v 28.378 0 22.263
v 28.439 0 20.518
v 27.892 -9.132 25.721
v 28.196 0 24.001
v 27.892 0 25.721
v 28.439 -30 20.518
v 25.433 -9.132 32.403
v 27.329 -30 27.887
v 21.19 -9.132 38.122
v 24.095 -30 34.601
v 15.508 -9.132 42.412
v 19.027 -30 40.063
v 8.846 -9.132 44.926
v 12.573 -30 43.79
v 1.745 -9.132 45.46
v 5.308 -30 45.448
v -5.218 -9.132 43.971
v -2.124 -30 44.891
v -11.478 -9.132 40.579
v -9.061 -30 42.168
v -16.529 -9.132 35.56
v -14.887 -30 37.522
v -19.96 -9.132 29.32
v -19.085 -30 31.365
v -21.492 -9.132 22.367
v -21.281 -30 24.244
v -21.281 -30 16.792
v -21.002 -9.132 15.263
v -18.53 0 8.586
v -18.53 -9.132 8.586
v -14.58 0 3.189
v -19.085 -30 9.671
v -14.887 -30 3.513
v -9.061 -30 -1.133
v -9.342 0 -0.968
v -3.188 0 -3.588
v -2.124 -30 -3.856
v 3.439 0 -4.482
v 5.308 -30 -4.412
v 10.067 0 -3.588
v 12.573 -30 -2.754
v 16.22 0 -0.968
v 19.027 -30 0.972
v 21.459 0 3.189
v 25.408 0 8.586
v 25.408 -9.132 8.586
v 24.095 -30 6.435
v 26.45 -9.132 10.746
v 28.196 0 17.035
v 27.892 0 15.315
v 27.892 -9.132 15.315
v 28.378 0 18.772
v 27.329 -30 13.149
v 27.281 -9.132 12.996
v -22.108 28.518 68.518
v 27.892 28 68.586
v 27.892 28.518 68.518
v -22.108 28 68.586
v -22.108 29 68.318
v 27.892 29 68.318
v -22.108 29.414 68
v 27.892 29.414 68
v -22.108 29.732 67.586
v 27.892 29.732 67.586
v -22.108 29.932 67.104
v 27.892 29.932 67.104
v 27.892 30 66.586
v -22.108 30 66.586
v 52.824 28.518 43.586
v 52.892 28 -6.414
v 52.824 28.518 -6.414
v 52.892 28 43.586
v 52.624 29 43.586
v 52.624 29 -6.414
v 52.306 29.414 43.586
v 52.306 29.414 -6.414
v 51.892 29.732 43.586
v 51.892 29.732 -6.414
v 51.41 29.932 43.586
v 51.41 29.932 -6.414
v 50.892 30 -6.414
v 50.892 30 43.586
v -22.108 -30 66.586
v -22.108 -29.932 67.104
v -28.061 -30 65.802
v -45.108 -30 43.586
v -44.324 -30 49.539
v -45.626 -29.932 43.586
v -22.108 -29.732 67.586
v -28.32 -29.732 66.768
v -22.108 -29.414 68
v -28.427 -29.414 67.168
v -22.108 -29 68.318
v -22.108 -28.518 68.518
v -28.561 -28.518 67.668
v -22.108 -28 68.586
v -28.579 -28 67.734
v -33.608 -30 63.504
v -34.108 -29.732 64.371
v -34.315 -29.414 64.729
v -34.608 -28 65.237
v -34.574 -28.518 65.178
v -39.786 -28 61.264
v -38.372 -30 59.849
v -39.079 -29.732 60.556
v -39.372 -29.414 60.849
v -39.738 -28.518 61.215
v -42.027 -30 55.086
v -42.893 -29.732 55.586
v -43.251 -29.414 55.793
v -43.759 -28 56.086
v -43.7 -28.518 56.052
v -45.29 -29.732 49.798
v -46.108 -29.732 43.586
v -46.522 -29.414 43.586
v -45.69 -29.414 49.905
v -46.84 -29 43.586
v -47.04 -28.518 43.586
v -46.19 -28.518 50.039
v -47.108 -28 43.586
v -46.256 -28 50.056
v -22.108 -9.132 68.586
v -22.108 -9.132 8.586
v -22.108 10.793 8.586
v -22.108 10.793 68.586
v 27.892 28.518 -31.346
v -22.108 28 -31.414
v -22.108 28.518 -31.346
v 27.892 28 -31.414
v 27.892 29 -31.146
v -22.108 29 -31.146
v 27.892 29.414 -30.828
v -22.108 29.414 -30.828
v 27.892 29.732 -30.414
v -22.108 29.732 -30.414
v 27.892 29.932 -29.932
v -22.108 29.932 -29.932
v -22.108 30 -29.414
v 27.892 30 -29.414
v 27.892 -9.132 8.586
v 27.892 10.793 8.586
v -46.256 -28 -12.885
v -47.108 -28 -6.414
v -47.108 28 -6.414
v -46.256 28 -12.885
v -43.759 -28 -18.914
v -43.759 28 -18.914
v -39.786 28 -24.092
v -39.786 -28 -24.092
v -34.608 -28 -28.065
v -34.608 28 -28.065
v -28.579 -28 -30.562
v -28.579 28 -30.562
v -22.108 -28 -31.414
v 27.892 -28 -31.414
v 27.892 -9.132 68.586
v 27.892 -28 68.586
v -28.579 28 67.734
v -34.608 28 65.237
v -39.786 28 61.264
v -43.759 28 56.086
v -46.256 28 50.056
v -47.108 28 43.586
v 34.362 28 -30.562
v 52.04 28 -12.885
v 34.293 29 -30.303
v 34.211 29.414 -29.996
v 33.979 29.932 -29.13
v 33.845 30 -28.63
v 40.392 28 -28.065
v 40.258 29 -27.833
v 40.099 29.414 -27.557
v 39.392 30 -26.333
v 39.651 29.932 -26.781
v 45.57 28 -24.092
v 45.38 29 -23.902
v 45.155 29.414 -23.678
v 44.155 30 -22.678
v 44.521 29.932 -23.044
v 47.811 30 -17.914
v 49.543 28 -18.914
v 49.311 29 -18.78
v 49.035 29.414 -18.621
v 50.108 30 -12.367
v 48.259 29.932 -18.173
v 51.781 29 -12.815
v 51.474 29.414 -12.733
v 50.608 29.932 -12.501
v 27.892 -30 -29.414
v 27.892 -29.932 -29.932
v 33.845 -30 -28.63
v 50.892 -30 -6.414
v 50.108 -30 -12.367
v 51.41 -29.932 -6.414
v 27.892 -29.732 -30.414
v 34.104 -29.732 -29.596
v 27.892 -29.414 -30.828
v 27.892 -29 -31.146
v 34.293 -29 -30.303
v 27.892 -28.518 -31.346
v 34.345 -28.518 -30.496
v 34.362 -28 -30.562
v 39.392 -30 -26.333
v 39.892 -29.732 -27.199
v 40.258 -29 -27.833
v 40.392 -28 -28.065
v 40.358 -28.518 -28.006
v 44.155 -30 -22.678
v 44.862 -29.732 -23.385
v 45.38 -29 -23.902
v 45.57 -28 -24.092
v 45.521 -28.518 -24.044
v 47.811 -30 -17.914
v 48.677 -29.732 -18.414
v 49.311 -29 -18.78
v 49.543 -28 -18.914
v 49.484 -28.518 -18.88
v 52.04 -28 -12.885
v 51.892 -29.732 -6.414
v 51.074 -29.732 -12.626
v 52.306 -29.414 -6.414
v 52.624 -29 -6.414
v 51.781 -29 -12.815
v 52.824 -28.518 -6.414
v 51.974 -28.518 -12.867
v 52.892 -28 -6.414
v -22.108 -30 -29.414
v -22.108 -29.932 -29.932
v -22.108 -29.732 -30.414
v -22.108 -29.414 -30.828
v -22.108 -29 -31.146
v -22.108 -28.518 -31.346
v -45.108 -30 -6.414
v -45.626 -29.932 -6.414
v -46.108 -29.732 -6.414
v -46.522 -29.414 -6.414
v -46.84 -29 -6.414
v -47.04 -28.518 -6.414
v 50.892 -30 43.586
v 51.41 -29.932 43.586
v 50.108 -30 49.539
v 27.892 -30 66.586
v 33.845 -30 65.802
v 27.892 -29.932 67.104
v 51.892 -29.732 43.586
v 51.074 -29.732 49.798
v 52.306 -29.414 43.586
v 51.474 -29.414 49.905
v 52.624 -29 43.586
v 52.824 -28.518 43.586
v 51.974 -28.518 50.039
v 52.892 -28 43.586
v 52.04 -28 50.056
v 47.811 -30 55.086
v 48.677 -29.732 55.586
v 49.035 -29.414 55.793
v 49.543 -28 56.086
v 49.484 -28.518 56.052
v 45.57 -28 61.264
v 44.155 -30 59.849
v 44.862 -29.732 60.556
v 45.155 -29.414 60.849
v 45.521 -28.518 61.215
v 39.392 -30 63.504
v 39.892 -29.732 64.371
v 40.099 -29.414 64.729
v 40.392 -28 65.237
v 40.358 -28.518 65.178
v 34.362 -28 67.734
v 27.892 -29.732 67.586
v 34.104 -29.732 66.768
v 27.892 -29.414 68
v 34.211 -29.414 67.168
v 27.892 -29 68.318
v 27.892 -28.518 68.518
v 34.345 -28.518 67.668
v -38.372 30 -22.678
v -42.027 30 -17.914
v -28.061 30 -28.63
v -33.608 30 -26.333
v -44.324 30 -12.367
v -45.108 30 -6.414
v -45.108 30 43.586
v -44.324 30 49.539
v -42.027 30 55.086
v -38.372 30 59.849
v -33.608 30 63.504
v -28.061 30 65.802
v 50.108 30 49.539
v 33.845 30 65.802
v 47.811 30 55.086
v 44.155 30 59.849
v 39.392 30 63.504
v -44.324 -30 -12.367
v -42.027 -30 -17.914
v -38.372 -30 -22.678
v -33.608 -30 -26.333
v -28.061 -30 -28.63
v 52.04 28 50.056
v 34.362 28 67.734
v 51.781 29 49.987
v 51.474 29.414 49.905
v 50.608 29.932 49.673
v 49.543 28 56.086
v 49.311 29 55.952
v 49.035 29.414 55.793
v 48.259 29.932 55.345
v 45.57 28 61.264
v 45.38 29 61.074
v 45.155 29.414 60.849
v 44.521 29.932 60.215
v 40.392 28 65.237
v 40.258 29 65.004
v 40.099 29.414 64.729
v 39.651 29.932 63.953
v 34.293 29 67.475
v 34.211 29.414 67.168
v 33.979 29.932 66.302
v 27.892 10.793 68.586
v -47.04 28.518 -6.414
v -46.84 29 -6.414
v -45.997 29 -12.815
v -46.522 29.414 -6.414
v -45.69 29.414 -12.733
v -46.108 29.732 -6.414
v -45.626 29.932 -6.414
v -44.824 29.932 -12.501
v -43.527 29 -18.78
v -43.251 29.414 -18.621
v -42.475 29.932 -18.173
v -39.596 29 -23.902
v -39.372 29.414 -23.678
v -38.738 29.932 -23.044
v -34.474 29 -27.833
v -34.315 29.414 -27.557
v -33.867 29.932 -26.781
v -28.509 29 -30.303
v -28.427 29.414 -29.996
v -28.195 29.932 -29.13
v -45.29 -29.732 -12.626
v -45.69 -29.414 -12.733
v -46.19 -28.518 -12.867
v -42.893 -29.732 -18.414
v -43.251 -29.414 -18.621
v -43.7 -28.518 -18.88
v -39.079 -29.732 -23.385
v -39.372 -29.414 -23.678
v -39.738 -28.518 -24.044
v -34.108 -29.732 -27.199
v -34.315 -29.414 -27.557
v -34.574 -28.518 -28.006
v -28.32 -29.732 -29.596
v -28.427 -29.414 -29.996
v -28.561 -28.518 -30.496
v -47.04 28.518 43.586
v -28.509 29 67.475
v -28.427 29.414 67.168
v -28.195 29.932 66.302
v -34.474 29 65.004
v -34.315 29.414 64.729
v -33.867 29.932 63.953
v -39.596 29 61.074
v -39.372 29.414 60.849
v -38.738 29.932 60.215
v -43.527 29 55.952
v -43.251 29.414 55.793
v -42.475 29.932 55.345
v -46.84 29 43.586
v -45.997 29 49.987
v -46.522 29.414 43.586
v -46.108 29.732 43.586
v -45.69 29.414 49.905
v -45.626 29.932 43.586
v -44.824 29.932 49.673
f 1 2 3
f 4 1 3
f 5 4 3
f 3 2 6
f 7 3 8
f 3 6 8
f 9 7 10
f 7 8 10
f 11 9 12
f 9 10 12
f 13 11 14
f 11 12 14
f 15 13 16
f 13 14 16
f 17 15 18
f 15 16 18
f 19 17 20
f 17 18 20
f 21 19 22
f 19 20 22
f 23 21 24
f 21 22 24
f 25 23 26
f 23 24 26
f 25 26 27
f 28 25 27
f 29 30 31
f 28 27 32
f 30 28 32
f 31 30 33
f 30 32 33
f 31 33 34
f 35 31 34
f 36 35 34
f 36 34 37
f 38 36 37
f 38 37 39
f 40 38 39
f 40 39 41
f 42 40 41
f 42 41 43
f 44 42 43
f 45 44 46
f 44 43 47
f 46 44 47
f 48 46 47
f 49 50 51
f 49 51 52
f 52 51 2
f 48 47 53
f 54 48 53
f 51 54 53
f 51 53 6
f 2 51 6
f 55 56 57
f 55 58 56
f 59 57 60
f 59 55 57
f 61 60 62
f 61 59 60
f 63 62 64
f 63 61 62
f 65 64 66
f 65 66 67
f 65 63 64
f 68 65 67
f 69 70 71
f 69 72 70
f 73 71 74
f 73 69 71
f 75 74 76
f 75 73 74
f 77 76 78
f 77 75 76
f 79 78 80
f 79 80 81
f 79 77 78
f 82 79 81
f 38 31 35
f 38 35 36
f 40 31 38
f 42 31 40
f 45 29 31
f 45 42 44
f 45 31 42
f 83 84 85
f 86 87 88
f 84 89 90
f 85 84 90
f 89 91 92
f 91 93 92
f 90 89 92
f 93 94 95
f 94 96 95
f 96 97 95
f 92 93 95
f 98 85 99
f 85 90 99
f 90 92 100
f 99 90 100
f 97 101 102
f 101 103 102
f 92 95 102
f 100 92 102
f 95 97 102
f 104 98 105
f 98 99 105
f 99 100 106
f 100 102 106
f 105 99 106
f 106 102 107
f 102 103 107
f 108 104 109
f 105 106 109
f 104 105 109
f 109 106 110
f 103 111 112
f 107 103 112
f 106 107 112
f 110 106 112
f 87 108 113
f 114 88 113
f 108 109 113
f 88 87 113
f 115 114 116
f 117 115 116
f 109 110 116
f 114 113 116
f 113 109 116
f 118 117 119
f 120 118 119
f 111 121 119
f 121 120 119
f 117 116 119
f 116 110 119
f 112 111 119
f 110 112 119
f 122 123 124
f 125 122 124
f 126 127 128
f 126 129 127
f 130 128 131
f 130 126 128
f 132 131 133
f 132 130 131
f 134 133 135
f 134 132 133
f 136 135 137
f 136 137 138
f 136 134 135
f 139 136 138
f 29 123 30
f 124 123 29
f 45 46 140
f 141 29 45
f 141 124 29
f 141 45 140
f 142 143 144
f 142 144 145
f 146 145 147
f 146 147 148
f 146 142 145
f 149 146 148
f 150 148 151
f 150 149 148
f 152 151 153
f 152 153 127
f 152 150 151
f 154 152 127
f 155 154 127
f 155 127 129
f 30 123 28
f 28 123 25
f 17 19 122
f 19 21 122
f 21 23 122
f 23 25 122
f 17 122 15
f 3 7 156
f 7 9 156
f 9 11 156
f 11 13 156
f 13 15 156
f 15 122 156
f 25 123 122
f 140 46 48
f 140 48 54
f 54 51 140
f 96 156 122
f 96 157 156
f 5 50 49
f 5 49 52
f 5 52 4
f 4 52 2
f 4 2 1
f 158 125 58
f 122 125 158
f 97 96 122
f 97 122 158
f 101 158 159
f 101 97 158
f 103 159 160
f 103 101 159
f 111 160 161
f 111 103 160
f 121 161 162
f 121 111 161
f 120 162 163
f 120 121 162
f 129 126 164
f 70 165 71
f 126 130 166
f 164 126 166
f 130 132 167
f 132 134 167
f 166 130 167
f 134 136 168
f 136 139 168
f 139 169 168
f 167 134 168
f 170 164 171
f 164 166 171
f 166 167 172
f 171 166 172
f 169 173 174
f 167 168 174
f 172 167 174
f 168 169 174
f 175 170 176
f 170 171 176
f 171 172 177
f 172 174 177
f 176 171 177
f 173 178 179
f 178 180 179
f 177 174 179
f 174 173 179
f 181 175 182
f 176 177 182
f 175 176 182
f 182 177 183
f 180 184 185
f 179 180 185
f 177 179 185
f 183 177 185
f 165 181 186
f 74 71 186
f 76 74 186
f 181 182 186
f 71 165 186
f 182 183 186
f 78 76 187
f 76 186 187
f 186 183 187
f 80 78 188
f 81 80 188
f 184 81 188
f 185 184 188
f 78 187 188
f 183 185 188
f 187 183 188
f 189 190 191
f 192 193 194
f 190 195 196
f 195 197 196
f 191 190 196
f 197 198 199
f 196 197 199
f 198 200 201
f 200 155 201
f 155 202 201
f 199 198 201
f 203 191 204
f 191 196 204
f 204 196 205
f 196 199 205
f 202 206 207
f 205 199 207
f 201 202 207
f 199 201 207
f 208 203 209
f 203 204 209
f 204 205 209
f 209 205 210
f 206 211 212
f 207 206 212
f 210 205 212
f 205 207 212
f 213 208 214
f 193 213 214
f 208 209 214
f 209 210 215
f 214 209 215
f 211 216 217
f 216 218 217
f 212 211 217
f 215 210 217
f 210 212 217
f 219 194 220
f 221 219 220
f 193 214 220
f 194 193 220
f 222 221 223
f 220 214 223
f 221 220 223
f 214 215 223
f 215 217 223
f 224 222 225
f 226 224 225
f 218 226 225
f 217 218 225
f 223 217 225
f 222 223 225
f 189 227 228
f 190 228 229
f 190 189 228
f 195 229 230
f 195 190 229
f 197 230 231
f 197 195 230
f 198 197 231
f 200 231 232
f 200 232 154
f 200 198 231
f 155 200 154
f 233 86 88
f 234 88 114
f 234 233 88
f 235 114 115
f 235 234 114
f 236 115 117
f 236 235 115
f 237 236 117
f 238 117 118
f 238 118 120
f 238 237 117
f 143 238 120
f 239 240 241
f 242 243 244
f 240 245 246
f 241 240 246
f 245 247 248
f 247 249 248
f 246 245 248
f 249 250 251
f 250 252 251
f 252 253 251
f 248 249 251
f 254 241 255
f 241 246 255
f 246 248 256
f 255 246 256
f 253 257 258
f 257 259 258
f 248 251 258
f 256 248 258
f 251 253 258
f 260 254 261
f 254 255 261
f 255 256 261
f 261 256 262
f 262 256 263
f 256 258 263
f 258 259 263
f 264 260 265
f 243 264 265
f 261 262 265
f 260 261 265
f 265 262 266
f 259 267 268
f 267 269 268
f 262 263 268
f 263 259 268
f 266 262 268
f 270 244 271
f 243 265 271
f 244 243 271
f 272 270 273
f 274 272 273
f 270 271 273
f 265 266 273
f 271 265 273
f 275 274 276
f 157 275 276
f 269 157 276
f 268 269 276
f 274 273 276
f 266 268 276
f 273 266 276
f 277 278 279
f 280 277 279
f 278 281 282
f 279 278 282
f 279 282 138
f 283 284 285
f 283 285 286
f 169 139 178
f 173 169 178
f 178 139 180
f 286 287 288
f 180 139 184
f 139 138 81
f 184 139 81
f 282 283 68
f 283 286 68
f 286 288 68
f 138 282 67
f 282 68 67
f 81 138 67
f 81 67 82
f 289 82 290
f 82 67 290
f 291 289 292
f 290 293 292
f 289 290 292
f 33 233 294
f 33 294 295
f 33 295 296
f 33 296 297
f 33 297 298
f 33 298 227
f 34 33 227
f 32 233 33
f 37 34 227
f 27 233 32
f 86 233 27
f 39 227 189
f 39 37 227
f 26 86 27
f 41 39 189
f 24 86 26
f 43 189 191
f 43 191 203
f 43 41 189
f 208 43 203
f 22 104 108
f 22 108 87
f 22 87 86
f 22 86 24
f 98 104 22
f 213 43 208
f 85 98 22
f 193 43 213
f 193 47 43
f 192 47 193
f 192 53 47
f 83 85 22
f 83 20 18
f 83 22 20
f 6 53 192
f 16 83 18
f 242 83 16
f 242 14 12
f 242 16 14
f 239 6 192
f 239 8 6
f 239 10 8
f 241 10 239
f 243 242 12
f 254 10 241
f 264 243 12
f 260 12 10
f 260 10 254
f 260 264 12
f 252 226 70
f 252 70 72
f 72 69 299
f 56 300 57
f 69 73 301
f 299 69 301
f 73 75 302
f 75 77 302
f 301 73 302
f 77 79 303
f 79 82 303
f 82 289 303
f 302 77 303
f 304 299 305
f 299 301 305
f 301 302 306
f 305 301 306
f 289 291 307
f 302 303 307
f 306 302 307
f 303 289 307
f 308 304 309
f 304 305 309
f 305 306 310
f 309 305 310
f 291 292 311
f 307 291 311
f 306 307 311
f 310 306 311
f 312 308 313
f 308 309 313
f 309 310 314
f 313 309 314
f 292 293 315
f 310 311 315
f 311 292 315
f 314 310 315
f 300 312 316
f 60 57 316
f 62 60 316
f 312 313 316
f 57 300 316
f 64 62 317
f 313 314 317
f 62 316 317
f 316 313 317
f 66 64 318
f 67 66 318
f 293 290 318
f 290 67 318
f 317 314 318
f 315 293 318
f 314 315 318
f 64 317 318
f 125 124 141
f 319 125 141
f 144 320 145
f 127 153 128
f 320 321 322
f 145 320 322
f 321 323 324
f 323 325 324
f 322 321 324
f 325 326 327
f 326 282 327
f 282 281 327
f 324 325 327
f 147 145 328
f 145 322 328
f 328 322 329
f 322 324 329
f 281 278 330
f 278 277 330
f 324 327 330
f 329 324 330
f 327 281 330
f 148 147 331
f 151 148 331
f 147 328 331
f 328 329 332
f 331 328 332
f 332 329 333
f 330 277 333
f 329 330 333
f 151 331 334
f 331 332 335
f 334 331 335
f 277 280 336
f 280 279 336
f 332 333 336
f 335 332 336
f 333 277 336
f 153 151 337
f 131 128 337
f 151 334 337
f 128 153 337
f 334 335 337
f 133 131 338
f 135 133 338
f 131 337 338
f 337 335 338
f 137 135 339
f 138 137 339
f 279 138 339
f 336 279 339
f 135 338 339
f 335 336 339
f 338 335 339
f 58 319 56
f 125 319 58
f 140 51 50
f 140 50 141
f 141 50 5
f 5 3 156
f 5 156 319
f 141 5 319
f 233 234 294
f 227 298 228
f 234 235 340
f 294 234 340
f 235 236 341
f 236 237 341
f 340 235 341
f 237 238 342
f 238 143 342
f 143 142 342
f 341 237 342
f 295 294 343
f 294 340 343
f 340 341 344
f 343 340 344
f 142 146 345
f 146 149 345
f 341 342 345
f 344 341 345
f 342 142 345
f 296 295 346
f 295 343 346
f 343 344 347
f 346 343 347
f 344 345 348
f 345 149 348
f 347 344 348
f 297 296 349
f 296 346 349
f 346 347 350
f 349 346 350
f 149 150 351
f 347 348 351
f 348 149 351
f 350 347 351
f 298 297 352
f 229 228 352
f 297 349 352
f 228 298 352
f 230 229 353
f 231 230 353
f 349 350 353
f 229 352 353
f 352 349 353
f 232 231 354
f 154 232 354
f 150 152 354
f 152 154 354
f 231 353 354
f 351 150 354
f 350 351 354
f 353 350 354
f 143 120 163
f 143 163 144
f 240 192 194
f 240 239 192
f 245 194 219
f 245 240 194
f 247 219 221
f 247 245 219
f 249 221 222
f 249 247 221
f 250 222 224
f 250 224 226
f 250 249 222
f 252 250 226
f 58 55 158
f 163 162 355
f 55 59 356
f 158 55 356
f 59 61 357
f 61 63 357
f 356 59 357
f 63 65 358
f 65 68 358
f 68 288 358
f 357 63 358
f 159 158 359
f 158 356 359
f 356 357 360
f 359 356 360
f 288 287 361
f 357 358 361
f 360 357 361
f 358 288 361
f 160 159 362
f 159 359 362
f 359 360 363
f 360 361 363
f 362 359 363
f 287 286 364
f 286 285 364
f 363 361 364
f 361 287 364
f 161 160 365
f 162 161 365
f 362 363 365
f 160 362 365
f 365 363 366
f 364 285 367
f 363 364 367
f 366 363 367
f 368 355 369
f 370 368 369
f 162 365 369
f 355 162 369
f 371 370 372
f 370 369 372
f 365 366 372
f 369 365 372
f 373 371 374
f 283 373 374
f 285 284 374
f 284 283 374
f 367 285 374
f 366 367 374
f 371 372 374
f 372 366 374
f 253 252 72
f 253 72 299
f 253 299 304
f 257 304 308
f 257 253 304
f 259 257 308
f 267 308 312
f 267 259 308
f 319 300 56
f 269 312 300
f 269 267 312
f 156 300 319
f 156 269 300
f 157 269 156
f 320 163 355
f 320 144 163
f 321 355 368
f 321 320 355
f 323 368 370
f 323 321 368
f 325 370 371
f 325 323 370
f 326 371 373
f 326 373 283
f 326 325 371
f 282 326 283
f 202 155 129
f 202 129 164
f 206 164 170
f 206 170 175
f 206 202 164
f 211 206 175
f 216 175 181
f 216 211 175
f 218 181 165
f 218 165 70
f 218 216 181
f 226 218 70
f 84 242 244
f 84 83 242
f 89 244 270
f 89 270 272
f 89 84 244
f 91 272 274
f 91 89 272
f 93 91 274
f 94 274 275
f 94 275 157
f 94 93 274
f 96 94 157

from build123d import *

# Parameters (mm, degrees)
F1_DEPTH = 30
F2_R     = 2
F3_R     = 2
F4_R     = 25
F5_DEPTH = 30
F6_W     = 50
F6_H     = 19.9247
F7_DEPTH = 60


with BuildPart() as f1:
    # F0 (on Front) → F1 (new body, symmetric)
    with BuildSketch(Plane.XZ):
        with BuildLine():
            Line((27.891926, 68.585901), (-22.108074, 68.585901))
            ThreePointArc((-22.108074, 68.585901), (-39.785743, 61.263571), (-47.108074, 43.585901))
            Line((-47.108074, 43.585901), (-47.108074, -6.414099))
            ThreePointArc((-47.108074, -6.414099), (-39.785743, -24.091768), (-22.108074, -31.414099))
            Line((-22.108074, -31.414099), (27.891926, -31.414099))
            ThreePointArc((27.891926, -31.414099), (45.569596, -24.091768), (52.891926, -6.414099))
            Line((52.891926, -6.414099), (52.891926, 43.585901))
            ThreePointArc((52.891926, 43.585901), (45.569596, 61.263571), (27.891926, 68.585901))
        make_face()
    extrude(amount=F1_DEPTH, both=True)

    # F2
    f2_edges = [f1.edges().sort_by_distance(p)[0] for p in [
        (52.891926, 30, 18.585901),
        (45.569596, 30, 61.263571),
        (2.891926, 30, 68.585901),
        (-39.785743, 30, 61.263571),
        (-47.108074, 30, 18.585901),
        (-39.785743, 30, -24.091768),
        (2.891926, 30, -31.414099),
        (45.569596, 30, -24.091768),
    ]]
    fillet(f2_edges, radius=F2_R)

    # F3
    f3_edges = [f1.edges().sort_by_distance(p)[0] for p in [
        (52.891926, -30, 18.585901),
        (45.569596, -30, 61.263571),
        (2.891926, -30, 68.585901),
        (-39.785743, -30, 61.263571),
        (-47.108074, -30, 18.585901),
        (-39.785743, -30, -24.091768),
        (2.891926, -30, -31.414099),
        (45.569596, -30, -24.091768),
    ]]
    fillet(f3_edges, radius=F3_R)

    # F4 (on face) → F5 (cut)
    with BuildSketch(Plane.XZ.offset(30)):
        with Locations((3.43938, 20.517696)):
            Circle(F4_R)
    extrude(amount=-F5_DEPTH, mode=Mode.SUBTRACT)

    # F6 (on face) → F7 (cut)
    with BuildSketch(Plane.XY.offset(68.585901)):
        with Locations((2.891926, 0.830196)):
            Rectangle(F6_W, F6_H)
    extrude(amount=-F7_DEPTH, mode=Mode.SUBTRACT)


solid = f1.part
